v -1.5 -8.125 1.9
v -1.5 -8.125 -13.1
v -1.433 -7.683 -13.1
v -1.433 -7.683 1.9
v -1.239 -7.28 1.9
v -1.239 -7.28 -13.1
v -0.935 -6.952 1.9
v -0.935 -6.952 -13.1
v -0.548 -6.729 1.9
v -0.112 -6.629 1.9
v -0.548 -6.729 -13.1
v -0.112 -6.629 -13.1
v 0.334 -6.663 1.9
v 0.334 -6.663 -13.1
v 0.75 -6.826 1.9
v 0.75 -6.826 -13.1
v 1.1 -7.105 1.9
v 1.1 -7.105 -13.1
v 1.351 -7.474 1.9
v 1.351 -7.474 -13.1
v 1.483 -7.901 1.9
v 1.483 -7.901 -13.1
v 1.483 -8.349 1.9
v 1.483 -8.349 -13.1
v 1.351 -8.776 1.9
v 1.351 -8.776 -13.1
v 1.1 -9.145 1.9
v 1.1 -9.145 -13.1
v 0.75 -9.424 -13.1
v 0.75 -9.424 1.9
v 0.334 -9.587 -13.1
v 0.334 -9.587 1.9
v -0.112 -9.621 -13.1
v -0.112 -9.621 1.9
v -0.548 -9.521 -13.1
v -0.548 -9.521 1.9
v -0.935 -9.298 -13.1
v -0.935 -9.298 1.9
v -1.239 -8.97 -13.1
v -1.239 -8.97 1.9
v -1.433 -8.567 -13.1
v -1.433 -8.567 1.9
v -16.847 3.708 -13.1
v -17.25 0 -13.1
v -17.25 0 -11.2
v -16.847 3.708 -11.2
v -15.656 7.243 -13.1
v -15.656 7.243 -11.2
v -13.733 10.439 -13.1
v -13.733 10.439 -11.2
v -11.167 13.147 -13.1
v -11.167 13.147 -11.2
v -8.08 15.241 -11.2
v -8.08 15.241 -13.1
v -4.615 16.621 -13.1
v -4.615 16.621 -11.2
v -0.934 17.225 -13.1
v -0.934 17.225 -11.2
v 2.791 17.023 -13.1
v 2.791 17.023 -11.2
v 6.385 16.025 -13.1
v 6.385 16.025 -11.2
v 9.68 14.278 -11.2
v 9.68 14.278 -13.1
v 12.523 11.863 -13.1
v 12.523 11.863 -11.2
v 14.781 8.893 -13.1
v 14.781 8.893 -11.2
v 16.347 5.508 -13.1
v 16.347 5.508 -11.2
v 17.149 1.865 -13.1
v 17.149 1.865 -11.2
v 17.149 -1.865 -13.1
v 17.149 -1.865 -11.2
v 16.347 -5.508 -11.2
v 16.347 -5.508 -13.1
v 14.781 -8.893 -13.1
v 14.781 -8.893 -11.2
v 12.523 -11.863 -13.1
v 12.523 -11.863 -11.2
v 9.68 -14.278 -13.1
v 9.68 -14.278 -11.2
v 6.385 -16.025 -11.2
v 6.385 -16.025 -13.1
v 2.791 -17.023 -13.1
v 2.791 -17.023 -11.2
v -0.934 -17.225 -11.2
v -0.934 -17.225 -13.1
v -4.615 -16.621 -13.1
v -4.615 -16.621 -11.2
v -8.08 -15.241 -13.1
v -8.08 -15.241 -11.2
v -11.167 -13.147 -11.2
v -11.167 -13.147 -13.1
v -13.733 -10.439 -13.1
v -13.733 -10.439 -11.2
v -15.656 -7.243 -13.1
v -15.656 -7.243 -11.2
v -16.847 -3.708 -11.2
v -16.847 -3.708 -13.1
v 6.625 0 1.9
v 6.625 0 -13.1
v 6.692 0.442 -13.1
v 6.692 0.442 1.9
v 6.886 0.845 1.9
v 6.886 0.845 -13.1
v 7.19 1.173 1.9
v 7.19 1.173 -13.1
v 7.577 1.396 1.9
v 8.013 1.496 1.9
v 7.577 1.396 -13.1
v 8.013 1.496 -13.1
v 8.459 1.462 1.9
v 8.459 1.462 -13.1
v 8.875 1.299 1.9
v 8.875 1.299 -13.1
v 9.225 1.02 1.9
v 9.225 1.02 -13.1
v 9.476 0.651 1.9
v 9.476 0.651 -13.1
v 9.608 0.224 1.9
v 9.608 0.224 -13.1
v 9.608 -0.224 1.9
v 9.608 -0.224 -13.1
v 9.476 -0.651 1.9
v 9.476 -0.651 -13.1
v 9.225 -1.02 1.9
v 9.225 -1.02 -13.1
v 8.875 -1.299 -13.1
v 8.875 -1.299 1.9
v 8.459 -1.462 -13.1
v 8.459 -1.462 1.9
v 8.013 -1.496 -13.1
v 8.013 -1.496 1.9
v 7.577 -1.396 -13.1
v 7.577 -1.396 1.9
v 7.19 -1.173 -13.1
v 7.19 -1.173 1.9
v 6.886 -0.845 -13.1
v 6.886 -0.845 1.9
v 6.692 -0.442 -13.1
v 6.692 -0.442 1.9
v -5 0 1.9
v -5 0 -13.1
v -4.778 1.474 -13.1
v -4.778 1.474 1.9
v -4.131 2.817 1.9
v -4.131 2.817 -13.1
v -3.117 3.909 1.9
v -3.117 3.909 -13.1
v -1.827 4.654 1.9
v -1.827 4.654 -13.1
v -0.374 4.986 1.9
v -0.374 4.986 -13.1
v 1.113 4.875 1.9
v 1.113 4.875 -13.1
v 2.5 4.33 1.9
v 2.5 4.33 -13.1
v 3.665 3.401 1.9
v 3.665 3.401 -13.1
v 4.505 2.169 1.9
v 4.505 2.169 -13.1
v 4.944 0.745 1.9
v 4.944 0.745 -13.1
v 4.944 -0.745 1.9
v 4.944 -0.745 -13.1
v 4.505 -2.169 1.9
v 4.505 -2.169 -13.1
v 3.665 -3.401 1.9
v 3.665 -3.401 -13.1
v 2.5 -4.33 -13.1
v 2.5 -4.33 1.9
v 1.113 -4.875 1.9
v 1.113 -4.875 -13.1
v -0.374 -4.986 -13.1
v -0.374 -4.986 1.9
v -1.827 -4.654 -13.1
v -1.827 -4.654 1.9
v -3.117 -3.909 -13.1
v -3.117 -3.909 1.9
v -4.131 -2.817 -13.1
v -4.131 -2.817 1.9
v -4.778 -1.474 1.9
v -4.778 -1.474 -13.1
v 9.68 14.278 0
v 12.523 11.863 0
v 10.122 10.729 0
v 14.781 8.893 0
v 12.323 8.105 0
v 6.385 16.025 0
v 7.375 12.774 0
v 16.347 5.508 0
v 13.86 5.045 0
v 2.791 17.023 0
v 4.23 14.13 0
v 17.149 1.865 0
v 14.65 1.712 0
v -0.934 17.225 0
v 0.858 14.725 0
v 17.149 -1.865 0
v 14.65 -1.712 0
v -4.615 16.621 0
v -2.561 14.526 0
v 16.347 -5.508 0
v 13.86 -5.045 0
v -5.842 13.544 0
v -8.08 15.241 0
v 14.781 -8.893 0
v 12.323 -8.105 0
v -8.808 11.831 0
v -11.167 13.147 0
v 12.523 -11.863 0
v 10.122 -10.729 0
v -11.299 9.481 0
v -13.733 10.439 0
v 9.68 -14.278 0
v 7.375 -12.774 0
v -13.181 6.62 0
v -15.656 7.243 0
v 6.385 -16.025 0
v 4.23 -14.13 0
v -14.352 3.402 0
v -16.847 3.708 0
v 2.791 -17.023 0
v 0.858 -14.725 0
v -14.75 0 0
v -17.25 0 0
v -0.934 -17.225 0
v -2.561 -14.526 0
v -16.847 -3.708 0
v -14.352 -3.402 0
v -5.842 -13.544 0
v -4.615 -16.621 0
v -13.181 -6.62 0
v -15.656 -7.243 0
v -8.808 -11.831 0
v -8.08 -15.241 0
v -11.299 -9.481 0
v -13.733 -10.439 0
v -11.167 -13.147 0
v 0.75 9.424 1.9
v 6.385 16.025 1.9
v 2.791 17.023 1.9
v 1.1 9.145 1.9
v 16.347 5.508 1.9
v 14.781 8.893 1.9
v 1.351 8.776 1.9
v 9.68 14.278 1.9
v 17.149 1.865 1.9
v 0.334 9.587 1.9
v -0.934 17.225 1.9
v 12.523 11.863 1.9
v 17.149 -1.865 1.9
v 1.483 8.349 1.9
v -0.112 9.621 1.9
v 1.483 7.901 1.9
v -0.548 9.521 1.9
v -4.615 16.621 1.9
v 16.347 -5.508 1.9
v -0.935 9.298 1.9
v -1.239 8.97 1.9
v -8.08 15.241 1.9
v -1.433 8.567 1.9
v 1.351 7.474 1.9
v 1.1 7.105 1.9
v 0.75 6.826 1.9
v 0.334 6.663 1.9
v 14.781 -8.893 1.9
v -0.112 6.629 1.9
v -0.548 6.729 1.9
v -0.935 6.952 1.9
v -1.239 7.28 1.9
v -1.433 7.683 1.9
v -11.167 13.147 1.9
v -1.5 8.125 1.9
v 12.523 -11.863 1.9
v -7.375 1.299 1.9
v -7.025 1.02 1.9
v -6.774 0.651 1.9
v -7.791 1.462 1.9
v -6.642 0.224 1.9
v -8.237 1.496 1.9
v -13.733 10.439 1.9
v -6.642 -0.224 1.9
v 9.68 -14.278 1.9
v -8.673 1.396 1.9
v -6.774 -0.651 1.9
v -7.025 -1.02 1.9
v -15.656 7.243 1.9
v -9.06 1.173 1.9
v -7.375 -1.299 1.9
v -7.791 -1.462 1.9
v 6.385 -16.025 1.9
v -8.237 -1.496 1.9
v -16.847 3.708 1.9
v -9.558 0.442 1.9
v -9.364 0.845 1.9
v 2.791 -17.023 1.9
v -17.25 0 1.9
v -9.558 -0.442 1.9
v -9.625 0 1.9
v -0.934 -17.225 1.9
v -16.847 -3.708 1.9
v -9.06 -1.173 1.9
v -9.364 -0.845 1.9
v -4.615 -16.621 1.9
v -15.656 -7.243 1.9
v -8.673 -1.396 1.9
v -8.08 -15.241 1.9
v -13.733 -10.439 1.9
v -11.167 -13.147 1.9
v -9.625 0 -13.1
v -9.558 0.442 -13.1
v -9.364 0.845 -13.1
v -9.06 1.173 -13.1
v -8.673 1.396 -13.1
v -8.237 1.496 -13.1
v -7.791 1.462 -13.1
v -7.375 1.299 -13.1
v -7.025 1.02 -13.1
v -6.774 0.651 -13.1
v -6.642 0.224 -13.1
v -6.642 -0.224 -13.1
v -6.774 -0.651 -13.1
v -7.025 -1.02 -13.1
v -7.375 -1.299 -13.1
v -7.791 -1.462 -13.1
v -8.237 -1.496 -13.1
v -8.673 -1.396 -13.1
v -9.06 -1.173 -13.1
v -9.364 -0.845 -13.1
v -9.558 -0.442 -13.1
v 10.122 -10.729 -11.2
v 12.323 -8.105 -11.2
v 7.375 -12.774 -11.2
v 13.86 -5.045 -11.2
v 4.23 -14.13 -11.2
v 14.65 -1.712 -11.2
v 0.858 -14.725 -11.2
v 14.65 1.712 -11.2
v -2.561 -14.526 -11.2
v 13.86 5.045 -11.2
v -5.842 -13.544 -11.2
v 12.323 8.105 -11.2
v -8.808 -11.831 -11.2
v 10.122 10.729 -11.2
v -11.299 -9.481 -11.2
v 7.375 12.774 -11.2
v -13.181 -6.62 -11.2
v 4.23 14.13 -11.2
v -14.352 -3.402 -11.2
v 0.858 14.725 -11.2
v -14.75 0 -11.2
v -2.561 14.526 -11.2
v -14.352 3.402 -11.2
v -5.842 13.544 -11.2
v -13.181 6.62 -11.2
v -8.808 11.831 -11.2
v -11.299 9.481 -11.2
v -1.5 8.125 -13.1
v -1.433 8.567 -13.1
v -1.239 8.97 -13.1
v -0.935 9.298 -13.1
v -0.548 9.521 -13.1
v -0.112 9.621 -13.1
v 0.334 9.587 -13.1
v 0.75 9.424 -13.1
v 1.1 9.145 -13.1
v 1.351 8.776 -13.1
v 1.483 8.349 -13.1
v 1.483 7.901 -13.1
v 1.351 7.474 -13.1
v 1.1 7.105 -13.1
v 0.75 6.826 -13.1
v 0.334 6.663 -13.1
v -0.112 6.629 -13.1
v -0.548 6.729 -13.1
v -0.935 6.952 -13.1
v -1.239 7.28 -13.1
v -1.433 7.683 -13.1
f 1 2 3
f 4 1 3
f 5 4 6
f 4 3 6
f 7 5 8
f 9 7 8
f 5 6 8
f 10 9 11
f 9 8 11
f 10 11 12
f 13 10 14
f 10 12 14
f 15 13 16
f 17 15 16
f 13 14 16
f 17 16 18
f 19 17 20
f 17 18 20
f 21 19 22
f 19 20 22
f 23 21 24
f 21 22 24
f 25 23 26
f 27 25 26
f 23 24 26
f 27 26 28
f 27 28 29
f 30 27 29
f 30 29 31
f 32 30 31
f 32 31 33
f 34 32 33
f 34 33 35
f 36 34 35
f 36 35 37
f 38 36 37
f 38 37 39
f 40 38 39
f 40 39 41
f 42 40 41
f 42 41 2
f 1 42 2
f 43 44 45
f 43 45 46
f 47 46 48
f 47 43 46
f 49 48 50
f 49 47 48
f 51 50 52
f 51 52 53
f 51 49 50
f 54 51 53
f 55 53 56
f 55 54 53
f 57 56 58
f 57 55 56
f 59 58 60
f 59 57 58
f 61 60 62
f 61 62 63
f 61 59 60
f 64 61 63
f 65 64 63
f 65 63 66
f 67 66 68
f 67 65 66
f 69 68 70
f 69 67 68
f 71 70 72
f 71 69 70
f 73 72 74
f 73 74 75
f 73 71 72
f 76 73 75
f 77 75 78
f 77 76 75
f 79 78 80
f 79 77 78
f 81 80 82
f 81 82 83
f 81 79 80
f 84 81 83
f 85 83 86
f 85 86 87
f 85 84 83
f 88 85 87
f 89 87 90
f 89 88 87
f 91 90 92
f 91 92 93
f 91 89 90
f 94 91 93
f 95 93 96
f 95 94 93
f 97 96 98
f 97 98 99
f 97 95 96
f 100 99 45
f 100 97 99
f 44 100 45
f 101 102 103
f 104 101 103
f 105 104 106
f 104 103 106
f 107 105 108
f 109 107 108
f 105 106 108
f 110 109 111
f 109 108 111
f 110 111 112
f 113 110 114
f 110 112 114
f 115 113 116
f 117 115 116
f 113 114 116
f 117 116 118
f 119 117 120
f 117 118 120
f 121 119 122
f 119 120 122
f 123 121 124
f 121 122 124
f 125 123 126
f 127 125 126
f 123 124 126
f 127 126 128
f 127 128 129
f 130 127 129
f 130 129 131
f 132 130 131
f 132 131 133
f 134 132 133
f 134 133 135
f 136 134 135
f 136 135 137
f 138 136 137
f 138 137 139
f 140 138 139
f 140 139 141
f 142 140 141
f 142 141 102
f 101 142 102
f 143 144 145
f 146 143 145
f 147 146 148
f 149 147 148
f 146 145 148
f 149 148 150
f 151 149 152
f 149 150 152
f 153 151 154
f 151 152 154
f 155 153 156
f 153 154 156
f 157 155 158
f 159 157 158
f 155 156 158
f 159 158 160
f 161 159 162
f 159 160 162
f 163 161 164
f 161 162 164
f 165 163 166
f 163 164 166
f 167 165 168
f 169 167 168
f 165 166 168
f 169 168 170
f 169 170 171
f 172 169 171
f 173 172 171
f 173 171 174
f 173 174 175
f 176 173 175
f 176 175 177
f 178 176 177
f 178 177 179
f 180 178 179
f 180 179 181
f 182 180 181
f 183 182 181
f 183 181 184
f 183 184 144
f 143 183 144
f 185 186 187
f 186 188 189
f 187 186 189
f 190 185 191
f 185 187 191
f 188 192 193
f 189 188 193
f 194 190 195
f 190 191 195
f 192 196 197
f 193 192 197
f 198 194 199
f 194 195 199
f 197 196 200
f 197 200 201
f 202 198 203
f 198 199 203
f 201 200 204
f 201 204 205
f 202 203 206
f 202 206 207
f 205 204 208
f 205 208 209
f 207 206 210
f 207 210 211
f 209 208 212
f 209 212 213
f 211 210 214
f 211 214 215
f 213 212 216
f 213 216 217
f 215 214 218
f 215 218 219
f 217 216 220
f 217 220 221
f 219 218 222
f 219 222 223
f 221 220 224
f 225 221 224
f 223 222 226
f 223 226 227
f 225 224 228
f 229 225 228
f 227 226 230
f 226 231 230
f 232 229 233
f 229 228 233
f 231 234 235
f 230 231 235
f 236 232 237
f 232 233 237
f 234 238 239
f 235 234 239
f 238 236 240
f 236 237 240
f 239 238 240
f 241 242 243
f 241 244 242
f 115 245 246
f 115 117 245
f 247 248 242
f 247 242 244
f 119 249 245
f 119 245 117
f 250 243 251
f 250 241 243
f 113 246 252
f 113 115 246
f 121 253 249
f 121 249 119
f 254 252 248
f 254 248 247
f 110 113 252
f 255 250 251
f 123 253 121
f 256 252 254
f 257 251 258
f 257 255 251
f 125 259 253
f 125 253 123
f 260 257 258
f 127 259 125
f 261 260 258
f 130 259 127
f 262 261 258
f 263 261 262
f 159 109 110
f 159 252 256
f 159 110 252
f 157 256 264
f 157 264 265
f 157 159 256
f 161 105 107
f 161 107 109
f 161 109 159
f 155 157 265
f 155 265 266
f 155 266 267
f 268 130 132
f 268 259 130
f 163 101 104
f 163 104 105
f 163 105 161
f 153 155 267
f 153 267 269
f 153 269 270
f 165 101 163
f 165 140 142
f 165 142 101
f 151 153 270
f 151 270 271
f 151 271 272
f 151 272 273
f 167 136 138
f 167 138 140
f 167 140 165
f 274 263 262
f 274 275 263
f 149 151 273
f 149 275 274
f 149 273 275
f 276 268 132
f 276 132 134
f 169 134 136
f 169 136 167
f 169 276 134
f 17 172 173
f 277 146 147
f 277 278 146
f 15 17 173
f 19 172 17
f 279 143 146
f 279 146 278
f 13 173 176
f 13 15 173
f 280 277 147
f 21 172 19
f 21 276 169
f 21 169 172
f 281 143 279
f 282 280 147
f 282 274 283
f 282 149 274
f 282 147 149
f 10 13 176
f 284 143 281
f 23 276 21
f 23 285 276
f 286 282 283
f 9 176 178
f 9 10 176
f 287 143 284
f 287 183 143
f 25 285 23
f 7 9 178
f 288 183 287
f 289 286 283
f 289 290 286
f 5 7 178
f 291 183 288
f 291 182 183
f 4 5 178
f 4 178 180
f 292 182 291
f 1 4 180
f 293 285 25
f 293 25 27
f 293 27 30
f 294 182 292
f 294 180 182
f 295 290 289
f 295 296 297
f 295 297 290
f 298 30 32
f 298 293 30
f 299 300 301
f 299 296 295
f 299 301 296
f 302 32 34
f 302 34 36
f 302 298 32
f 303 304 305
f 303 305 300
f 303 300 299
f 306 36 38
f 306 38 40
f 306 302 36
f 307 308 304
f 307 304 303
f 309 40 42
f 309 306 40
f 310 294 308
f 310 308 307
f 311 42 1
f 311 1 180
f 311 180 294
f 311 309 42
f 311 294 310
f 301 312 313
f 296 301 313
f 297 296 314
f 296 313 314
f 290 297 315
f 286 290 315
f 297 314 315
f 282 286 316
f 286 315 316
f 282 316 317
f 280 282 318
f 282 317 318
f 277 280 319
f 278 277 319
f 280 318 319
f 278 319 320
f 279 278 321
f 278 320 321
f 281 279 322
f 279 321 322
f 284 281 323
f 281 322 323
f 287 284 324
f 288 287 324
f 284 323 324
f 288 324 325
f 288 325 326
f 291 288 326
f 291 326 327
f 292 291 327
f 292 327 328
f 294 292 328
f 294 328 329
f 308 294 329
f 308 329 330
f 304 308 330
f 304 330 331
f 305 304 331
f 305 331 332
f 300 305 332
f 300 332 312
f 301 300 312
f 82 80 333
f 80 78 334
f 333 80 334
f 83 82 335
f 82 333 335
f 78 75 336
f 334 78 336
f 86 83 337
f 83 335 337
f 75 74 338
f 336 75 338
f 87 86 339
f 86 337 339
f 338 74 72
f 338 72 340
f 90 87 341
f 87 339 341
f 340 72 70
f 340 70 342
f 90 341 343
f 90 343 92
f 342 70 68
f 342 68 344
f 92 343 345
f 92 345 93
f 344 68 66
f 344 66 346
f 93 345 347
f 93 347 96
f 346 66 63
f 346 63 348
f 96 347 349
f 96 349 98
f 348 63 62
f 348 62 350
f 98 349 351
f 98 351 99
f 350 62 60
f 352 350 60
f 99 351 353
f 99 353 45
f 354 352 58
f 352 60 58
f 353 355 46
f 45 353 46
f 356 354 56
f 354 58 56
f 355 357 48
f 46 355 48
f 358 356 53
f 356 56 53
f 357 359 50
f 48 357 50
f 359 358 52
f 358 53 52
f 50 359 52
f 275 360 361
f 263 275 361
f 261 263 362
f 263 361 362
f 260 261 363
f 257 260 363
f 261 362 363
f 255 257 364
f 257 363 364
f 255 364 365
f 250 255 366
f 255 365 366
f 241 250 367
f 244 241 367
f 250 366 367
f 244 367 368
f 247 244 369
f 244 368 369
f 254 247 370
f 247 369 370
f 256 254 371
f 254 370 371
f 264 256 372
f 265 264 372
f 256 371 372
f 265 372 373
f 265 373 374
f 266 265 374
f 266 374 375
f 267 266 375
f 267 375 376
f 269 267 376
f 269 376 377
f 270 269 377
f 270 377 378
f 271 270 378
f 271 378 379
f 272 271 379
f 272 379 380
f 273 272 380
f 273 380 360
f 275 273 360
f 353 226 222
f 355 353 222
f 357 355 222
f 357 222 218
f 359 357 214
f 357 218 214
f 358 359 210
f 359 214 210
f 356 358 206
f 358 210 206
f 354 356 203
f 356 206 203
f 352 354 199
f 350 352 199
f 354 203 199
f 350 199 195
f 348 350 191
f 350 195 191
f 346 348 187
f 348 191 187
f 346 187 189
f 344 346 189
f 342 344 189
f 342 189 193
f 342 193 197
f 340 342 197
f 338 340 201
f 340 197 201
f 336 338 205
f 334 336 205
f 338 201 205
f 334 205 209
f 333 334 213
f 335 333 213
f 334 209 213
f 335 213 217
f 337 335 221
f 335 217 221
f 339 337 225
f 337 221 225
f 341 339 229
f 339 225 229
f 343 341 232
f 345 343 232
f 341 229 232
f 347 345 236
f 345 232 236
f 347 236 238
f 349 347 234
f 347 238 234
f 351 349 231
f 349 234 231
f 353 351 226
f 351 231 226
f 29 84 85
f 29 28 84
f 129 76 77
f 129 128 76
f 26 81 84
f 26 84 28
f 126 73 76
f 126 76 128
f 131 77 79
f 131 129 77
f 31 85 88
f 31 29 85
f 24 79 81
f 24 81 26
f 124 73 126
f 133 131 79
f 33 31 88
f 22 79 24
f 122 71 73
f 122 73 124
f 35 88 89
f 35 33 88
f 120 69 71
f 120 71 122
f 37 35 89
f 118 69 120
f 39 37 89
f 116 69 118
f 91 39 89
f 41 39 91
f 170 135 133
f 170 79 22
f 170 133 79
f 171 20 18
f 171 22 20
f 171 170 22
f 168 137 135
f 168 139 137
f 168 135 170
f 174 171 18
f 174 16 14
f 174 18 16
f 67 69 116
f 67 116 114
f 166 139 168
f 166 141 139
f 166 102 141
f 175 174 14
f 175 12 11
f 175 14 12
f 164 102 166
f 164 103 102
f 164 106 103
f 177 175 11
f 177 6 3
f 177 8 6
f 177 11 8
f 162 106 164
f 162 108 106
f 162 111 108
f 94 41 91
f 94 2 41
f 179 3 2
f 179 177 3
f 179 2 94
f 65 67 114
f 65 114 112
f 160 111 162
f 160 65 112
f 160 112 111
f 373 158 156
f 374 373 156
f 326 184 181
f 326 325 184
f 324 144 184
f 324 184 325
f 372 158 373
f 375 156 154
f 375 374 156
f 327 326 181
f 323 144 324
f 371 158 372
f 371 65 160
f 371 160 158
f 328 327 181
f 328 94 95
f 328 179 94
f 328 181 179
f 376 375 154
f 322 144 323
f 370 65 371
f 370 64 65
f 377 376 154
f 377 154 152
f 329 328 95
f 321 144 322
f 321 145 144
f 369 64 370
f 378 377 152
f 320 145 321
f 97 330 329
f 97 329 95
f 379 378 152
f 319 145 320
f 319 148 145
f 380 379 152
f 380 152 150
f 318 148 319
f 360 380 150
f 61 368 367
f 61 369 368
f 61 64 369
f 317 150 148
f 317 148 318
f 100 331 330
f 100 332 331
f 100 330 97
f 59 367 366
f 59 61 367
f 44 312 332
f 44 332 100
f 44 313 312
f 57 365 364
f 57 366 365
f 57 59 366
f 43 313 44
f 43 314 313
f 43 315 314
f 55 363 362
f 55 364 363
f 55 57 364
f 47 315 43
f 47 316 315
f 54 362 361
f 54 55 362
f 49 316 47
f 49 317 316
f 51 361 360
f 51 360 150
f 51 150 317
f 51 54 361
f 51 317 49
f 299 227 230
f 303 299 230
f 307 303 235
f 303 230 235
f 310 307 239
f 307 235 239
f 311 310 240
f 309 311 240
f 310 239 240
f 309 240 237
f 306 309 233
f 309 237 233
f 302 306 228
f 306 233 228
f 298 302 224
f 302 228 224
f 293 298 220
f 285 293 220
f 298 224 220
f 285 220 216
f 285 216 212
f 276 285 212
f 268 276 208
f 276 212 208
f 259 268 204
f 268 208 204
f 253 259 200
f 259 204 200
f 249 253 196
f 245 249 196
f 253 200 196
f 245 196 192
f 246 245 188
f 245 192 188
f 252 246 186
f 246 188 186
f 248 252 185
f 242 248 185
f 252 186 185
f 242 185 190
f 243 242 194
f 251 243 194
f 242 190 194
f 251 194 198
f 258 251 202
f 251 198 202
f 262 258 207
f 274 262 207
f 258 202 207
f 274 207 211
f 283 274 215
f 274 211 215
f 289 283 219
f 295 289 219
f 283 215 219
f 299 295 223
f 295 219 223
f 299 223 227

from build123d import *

# Parameters (mm, degrees)
SKETCH1_R           = 17.25
BOSS_EXTRUDE1_DEPTH = 1.9
SKETCH2_R           = 14.75
BOSS_EXTRUDE2_DEPTH = 11.2
BOSS_EXTRUDE3_START = 1.9
SKETCH3_R           = 17.25
BOSS_EXTRUDE3_DEPTH = 1.9
SKETCH4_R           = 5
CUT_EXTRUDE1_DEPTH  = 29.637824638
SKETCH5_R           = 1.5
CUT_EXTRUDE2_DEPTH  = 29.637824638


with BuildPart() as part:
    # Sketch1 → Boss-Extrude1 (new body)
    with BuildSketch(Plane.XY):
        with Locations(Location((0, 0, 0), (0, 0, 180))):
            Circle(SKETCH1_R)
    extrude(amount=BOSS_EXTRUDE1_DEPTH)

    # Sketch2 → Boss-Extrude2 (add)
    with BuildSketch(Plane(origin=(0, 0, 0), x_dir=(-1, 0, 0), z_dir=(0, 0, -1))):
        Circle(SKETCH2_R)
    extrude(amount=BOSS_EXTRUDE2_DEPTH)

    # Sketch3 → Boss-Extrude3 (add)
    with BuildSketch(Plane(origin=(0, 0, -11.2), x_dir=(-1, 0, 0), z_dir=(0, 0, -1)).offset(BOSS_EXTRUDE3_START)):
        Circle(SKETCH3_R)
    extrude(amount=-BOSS_EXTRUDE3_DEPTH)

    # Sketch4 → Cut-Extrude1 (cut, through all)
    with BuildSketch(Plane(origin=(0, 0, -13.1), x_dir=(-1, 0, 0), z_dir=(0, 0, -1))):
        Circle(SKETCH4_R)
    extrude(amount=-CUT_EXTRUDE1_DEPTH, mode=Mode.SUBTRACT)

    # Sketch5 → Cut-Extrude2 (cut, through all)
    with BuildSketch(Plane(origin=(0, 0, -13.1), x_dir=(-1, 0, 0), z_dir=(0, 0, -1))):
        with Locations((0, 8.125)):
            Circle(SKETCH5_R)
        with Locations((8.125, 0)):
            Circle(SKETCH5_R)
        with Locations((0, -8.125)):
            Circle(SKETCH5_R)
        with Locations((-8.125, 0)):
            Circle(SKETCH5_R)
    extrude(amount=-CUT_EXTRUDE2_DEPTH, mode=Mode.SUBTRACT)


solid = part.part
